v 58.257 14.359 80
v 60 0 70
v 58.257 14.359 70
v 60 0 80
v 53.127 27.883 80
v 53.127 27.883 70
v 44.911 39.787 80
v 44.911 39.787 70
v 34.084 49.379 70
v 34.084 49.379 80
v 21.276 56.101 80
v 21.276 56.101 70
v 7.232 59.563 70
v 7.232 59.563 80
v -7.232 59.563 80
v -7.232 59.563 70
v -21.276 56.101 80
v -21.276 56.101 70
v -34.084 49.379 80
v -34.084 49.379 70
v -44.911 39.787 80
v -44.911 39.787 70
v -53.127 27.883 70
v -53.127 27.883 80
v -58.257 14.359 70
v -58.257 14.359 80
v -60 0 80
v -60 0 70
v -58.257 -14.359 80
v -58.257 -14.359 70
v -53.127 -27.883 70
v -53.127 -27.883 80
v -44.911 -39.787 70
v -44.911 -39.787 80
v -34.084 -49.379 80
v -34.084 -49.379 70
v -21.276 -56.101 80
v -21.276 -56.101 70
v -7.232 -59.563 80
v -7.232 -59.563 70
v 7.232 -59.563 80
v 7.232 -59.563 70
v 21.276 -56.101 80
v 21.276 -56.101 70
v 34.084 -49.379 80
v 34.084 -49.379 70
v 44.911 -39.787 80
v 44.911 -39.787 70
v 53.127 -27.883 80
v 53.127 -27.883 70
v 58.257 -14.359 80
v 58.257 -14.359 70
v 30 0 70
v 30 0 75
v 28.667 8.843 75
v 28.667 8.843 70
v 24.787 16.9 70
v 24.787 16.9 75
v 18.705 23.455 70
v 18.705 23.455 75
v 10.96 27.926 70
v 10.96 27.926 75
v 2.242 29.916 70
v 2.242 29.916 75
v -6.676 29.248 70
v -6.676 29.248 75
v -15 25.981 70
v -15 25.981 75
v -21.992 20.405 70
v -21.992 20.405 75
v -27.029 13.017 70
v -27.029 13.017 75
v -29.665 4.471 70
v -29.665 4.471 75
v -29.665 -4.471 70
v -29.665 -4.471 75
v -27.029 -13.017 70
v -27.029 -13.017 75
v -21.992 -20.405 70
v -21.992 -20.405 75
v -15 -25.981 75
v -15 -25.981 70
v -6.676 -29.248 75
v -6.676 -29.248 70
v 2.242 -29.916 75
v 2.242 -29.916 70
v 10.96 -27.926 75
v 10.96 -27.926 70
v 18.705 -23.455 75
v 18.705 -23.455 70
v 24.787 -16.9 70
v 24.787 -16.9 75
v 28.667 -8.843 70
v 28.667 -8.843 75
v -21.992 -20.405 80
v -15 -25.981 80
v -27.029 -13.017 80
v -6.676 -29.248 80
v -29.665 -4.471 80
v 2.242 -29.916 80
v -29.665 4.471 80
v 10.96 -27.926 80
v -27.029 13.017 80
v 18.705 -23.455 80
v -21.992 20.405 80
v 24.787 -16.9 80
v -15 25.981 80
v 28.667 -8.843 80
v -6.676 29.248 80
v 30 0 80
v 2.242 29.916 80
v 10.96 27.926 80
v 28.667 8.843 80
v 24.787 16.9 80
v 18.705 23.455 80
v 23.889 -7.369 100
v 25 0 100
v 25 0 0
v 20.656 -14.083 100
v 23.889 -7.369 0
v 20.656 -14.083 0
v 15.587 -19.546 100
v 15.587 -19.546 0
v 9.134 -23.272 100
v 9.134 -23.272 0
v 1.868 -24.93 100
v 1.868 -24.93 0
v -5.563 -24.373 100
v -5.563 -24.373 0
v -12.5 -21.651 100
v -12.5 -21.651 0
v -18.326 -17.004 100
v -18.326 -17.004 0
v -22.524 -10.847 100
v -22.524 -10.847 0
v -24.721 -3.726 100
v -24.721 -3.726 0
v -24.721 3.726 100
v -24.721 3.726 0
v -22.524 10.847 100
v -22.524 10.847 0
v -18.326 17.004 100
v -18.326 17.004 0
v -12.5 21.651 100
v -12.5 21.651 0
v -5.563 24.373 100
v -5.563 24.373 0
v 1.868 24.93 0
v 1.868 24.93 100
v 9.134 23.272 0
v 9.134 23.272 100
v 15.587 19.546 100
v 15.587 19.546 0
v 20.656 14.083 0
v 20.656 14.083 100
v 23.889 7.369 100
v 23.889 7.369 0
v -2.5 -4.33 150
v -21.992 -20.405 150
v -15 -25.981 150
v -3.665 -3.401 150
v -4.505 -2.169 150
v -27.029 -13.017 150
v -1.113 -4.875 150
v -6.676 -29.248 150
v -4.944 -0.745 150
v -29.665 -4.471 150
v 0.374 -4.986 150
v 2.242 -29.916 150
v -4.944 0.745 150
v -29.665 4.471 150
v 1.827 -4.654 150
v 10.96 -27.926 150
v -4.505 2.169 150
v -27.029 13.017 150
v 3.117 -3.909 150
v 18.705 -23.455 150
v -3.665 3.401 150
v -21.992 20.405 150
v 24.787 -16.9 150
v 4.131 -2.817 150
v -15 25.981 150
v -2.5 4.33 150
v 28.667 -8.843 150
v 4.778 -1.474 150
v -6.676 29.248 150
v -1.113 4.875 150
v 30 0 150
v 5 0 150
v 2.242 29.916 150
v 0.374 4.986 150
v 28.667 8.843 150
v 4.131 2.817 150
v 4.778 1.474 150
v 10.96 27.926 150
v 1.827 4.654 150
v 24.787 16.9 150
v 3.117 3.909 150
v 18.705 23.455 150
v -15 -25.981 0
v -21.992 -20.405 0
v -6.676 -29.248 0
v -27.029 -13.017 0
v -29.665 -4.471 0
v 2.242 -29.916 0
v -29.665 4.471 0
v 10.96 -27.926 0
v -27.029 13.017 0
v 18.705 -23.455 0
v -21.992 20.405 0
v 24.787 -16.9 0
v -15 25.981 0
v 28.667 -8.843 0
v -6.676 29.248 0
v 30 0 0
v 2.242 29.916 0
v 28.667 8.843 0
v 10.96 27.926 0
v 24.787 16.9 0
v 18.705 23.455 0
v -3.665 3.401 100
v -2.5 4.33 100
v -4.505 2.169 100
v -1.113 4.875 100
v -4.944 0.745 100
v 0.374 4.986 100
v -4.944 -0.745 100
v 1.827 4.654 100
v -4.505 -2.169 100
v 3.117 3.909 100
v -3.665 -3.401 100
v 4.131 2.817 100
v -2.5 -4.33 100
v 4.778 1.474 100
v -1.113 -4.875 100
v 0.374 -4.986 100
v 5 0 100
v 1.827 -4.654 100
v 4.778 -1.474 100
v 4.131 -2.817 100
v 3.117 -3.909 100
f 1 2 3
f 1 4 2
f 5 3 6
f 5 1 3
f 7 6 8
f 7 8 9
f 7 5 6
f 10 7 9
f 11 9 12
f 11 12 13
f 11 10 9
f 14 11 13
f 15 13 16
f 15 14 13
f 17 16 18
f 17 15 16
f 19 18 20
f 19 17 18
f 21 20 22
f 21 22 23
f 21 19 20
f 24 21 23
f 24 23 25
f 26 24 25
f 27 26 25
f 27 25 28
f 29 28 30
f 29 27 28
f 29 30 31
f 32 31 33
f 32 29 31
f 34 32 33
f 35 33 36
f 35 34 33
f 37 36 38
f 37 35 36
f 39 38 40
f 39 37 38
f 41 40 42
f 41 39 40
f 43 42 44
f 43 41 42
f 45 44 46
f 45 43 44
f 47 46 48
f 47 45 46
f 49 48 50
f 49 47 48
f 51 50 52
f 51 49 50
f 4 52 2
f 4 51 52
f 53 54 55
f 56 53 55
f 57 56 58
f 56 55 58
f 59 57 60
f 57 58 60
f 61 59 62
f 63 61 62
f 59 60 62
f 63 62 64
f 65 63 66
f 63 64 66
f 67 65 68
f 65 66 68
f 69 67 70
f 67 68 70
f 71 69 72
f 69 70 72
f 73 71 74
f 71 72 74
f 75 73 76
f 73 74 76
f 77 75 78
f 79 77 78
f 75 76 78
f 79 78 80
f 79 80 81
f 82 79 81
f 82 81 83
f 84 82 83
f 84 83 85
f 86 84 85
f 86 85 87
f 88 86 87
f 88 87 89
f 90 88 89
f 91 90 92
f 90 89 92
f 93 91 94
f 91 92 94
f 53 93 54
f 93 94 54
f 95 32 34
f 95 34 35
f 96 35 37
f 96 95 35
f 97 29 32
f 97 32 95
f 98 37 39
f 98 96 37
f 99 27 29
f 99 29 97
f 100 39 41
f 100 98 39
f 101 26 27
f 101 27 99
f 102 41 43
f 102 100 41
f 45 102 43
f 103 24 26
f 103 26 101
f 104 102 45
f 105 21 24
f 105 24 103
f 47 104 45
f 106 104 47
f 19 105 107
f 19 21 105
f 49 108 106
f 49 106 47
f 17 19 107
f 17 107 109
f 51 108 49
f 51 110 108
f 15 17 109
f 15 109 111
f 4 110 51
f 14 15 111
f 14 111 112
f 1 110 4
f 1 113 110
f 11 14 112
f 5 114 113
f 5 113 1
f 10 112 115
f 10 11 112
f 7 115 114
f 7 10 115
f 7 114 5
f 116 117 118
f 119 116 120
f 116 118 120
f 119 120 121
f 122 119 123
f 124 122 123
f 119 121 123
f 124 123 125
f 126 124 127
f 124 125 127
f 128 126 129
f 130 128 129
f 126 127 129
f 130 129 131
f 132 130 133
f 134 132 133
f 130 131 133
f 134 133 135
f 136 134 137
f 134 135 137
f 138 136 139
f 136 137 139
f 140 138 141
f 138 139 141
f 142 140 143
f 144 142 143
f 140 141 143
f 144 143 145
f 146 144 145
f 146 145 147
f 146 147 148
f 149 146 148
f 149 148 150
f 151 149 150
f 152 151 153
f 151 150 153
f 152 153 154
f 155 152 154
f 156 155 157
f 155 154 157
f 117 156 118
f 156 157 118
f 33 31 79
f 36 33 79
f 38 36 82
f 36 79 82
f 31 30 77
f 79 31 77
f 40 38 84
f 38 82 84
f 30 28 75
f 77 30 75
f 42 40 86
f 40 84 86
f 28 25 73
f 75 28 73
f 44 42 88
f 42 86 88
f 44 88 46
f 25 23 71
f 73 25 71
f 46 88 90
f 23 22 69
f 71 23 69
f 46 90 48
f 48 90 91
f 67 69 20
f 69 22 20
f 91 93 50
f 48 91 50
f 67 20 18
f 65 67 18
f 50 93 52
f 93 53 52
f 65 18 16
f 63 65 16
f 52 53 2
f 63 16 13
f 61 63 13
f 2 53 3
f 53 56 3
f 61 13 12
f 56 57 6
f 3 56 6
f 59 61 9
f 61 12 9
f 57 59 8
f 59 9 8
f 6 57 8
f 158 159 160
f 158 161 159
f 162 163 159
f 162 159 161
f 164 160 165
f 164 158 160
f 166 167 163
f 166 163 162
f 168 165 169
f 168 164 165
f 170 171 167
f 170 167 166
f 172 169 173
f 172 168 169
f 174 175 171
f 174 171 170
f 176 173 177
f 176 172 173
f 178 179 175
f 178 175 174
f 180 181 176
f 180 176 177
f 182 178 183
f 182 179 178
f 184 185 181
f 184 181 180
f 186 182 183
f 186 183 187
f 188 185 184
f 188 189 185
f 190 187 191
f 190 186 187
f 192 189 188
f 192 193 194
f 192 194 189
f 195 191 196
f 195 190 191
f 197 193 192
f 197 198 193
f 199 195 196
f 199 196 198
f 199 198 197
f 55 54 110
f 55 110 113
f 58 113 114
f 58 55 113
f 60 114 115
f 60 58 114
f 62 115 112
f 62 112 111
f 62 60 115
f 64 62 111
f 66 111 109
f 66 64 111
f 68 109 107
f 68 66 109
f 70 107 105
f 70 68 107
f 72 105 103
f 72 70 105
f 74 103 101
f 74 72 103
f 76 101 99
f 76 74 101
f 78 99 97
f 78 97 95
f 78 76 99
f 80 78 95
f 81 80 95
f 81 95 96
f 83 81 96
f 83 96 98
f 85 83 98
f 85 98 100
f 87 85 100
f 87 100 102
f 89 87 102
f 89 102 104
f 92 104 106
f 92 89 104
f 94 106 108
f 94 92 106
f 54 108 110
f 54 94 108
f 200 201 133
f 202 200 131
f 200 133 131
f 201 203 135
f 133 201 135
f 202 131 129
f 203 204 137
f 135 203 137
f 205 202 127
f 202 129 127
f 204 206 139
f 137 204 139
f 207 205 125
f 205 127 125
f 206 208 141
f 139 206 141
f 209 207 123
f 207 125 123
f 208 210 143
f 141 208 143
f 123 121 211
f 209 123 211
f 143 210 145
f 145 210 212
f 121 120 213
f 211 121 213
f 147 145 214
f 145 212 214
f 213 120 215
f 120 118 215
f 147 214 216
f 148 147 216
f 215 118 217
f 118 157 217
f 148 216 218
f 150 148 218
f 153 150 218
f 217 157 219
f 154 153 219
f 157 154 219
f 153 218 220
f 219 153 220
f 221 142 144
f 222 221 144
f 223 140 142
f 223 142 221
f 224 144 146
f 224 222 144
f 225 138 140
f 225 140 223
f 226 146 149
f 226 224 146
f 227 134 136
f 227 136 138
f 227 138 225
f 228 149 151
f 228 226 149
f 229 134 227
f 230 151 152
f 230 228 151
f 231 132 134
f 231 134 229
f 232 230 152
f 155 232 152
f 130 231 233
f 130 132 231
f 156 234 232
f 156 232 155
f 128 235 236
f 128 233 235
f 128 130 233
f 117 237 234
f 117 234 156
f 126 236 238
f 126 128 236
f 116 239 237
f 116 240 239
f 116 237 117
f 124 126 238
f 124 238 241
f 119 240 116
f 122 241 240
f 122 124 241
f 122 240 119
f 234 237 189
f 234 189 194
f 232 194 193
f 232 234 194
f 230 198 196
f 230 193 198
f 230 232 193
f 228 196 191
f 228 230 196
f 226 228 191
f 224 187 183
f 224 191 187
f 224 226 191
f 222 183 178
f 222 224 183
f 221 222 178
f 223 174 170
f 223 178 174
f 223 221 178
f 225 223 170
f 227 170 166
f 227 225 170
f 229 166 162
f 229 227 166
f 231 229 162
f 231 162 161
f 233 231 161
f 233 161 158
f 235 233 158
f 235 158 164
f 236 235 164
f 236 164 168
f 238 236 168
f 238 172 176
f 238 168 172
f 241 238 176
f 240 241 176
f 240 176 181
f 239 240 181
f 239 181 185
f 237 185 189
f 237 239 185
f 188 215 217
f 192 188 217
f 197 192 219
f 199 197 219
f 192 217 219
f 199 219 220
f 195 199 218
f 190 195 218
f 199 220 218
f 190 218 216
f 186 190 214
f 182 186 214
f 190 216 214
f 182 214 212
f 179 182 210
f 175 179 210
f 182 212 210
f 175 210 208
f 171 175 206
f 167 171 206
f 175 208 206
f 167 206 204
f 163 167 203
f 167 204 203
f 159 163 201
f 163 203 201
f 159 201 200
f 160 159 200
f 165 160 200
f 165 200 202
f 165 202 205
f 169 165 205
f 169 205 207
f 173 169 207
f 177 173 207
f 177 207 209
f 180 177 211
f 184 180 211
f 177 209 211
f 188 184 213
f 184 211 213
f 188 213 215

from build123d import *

# Parameters (mm, degrees)
F0_R          = 30
F1_DEPTH      = 150
F2_R          = 25
F3_DEPTH      = 100
F4_R          = 5
F5_DEPTH      = 150.001
F7_R          = 60
F7_R_2        = 30
F8_DEPTH      = 5
F8_DEPTH_BACK = 5


with BuildPart() as f1:
    # F0 (on Top) → F1 (new body)
    with BuildSketch(Plane.XY):
        Circle(F0_R)
    extrude(amount=F1_DEPTH)

    # F2 (on face) → F3 (cut)
    with BuildSketch(Plane(origin=(0, 0, 0), x_dir=(1, 0, 0), z_dir=(0, 0, -1))):
        Circle(F2_R)
    extrude(amount=-F3_DEPTH, mode=Mode.SUBTRACT)

    # F4 (on Top) → F5 (cut, through all)
    with BuildSketch(Plane.XY):
        Circle(F4_R)
    extrude(amount=F5_DEPTH, mode=Mode.SUBTRACT)


with BuildPart() as f8:
    # F7 (on offset) → F8 (new body, two sides)
    with BuildSketch(Plane.XY.offset(75)) as f8_sk:
        Circle(F7_R)
        Circle(F7_R_2, mode=Mode.SUBTRACT)
    extrude(amount=F8_DEPTH)
    extrude(f8_sk.sketch, amount=-F8_DEPTH_BACK)


solid = Compound([f1.part, f8.part])
